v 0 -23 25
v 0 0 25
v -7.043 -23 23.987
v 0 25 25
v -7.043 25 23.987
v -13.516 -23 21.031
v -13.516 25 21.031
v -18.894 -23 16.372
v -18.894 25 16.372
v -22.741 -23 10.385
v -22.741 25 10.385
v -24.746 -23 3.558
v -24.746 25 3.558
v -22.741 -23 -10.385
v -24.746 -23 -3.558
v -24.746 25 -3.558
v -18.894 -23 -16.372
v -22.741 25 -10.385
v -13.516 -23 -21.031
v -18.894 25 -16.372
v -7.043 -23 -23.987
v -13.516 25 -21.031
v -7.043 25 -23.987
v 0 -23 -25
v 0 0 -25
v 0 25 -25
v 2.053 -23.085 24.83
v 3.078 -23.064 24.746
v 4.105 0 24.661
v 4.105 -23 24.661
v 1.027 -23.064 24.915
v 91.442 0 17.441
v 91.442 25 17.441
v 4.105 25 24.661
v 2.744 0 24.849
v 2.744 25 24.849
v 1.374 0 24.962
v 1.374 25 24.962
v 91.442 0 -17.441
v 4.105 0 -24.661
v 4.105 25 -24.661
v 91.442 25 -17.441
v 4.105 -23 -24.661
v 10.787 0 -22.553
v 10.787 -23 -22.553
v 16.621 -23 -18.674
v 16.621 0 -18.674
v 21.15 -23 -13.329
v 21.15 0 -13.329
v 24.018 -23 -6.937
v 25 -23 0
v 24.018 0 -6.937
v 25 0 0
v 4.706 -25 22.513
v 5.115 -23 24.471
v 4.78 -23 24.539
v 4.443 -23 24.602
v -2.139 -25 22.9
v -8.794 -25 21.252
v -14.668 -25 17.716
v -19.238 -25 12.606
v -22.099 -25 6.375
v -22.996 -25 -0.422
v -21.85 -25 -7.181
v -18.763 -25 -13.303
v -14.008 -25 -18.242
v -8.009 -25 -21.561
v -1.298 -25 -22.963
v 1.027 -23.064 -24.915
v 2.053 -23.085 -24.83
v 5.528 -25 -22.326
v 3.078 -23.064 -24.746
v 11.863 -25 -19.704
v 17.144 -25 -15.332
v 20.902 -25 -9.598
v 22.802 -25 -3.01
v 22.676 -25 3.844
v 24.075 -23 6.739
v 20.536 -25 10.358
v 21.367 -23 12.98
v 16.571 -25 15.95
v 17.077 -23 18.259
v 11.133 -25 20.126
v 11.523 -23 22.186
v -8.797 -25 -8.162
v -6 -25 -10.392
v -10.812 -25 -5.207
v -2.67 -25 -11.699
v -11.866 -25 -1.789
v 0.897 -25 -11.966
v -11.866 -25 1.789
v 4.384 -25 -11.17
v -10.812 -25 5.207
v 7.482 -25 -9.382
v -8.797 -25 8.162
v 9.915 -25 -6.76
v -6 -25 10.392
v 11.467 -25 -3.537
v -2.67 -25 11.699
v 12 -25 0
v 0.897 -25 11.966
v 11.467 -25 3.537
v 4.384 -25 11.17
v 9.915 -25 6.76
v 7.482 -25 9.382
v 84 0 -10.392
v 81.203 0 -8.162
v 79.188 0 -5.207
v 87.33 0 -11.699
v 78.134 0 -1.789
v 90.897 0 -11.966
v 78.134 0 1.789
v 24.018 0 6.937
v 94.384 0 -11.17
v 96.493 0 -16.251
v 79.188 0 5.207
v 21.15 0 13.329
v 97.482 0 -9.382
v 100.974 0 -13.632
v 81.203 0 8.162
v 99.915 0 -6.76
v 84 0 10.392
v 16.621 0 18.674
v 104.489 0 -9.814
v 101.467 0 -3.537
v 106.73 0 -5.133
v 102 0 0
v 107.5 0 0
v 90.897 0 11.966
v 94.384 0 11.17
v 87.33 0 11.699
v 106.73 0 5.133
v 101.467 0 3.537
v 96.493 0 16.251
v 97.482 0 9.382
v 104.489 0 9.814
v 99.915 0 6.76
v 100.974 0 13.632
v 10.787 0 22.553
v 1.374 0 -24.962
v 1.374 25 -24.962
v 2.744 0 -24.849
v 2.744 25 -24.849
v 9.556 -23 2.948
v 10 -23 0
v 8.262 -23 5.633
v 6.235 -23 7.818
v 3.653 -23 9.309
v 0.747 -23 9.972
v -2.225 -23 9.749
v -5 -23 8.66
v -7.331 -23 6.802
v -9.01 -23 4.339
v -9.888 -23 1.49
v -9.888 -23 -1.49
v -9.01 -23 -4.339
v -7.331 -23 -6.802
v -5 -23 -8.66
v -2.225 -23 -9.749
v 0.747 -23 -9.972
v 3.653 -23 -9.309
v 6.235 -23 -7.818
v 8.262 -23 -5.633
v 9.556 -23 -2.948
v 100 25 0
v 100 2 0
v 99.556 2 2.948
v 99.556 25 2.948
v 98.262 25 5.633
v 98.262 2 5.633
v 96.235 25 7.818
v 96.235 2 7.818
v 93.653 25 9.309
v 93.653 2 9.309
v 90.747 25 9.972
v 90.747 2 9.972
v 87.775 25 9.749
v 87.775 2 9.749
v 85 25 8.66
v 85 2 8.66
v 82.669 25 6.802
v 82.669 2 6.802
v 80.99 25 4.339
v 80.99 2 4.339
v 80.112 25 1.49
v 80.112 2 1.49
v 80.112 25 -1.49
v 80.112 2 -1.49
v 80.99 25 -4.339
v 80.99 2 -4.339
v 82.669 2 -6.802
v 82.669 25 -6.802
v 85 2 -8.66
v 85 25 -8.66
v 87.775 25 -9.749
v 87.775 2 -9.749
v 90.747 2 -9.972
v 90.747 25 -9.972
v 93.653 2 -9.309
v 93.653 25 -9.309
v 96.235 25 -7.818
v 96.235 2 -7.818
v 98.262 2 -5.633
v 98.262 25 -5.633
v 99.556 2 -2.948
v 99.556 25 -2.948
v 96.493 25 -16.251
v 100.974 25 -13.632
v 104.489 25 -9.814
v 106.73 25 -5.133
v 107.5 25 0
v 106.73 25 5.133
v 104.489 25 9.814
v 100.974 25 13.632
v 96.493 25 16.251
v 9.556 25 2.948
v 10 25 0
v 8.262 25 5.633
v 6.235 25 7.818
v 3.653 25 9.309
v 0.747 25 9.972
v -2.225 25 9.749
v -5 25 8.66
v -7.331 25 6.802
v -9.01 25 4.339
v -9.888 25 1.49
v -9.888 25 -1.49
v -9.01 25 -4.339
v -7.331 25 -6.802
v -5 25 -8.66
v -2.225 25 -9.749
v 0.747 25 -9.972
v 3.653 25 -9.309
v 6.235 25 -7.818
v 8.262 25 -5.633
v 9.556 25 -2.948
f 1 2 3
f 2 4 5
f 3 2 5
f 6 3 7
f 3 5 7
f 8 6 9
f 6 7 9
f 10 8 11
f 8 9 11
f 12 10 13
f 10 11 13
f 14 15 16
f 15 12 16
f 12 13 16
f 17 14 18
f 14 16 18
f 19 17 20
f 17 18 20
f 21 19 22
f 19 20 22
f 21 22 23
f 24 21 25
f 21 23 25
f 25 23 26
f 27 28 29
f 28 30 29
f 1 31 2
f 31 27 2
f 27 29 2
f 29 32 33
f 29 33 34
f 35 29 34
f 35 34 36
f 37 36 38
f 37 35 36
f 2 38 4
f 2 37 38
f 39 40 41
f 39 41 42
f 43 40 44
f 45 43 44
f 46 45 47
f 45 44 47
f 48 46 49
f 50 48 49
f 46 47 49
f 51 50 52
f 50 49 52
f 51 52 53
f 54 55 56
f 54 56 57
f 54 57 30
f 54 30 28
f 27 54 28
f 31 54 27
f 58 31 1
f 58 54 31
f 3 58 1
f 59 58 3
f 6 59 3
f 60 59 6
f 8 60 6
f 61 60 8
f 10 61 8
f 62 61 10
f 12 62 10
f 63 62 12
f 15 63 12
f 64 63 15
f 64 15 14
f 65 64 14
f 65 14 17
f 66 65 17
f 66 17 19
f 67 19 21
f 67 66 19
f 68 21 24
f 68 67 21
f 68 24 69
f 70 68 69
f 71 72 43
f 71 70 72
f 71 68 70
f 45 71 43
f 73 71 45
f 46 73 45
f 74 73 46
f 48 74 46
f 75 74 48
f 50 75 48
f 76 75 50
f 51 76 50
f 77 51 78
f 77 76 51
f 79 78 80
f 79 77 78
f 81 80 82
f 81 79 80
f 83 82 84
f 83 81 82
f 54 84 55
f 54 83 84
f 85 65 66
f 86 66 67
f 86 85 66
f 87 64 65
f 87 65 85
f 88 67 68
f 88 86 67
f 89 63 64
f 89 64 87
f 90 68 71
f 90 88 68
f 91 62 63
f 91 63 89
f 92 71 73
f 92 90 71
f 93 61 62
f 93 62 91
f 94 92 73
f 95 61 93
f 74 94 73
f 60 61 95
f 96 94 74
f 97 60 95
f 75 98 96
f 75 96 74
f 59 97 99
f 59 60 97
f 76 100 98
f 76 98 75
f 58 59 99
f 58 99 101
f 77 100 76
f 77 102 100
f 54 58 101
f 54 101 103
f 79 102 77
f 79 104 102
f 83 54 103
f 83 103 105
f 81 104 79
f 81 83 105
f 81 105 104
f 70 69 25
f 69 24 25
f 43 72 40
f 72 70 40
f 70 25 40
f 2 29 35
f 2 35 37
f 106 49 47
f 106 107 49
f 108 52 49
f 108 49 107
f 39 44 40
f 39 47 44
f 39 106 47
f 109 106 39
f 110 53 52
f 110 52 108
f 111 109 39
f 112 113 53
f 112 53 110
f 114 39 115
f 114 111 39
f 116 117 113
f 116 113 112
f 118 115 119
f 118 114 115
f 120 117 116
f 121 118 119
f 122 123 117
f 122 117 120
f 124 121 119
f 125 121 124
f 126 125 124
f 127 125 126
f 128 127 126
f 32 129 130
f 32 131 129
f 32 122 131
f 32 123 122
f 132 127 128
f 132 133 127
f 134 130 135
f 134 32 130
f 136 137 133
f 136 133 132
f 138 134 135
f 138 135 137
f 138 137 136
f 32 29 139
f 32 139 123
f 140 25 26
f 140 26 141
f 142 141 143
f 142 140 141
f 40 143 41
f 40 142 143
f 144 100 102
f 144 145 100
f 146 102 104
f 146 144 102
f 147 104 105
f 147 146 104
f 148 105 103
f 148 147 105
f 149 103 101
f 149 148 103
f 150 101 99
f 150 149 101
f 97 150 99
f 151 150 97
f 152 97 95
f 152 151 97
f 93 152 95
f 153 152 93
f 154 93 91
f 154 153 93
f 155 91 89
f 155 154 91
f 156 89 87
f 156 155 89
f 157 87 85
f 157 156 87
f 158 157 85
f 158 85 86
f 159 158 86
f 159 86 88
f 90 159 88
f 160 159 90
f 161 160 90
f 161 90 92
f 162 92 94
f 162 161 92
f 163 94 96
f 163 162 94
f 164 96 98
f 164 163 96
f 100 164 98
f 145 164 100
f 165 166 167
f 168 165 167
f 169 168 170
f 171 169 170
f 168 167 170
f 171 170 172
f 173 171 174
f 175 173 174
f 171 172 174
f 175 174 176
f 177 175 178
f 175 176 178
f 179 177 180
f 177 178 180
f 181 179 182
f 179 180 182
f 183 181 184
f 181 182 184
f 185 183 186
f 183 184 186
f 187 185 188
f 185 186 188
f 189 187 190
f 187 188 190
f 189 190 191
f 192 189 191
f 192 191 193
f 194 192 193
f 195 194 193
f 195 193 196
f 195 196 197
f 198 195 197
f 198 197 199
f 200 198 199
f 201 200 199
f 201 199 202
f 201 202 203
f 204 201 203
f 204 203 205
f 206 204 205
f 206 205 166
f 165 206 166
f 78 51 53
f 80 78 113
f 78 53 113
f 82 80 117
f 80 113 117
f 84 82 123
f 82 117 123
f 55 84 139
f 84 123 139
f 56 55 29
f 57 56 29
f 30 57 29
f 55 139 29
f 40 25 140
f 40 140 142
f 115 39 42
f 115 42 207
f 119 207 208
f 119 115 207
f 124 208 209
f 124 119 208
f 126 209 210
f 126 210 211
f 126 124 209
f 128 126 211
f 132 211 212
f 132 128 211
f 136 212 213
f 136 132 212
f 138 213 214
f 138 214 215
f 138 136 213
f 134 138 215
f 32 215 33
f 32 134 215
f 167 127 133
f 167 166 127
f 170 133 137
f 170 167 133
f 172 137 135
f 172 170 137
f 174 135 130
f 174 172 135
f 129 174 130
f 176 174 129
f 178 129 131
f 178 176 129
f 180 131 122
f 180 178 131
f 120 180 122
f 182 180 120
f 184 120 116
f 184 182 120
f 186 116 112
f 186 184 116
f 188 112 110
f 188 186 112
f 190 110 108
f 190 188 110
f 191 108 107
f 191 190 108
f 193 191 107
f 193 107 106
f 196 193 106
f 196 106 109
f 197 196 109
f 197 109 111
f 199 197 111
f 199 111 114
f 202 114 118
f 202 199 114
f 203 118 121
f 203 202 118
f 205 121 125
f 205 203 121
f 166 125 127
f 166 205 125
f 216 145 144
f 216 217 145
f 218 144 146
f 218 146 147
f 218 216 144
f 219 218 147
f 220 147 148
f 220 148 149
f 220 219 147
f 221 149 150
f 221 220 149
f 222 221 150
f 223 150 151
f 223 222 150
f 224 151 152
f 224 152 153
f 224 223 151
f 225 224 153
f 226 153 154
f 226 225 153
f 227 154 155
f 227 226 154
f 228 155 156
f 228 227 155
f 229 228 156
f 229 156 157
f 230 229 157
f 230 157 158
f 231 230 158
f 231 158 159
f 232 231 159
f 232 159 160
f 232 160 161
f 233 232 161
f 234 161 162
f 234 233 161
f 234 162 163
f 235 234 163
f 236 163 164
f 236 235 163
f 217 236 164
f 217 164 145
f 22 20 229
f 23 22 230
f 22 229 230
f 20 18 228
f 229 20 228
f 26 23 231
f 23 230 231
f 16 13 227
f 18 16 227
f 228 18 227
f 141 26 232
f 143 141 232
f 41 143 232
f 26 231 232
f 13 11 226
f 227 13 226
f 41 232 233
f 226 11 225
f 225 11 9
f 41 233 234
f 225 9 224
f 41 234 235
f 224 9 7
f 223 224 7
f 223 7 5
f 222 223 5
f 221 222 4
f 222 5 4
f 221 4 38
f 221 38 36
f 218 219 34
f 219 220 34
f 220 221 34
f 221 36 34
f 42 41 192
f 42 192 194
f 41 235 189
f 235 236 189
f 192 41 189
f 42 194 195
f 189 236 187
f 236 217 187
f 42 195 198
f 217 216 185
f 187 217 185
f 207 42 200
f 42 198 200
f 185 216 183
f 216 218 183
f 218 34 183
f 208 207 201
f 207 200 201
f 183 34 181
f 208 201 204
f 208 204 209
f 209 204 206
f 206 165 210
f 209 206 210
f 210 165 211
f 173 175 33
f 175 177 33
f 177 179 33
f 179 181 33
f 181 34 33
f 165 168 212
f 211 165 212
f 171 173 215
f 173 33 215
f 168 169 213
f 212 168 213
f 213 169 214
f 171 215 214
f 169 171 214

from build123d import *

# Parameters (mm, degrees)
F0_R        = 10
F1_DEPTH    = 25
F2_DEPTH    = 25
F3_T2_ANGLE = 203.6133668192
F3_T8_ANGLE = 184.7022290241


# Not quite as in the source:
# - a fillet or chamfer that OpenCascade refuses, or shapes differently, is made with other operations: its cross-section is extruded or revolved along the edge and cut away or added


with BuildPart() as f1:
    # F0 (on Front) → F1 (new body)
    with BuildSketch(Plane.XZ):
        with BuildLine():
            Line((4.1054428346, 24.6606029758), (0, 25))
            ThreePointArc((0, 25), (-25, 0), (0, -25))
            Line((0, -25), (4.1054428346, -24.6606029758))
            ThreePointArc((4.1054428346, -24.6606029758), (19.0740146648, -16.1611251022), (25, 0))
            ThreePointArc((25, 0), (19.0740146648, 16.1611251022), (4.1054428346, 24.6606029758))
        make_face()
        Circle(F0_R, mode=Mode.SUBTRACT)
        with BuildLine():
            ThreePointArc((4.1054428346, 24.6606029758), (2.0597239626, 24.9150062653), (0, 25))
            Line((0, 25), (4.1054428346, 24.6606029758))
        make_face()
        with BuildLine():
            Line((4.1054428346, -24.6606029758), (0, -25))
            ThreePointArc((0, -25), (2.0597239626, -24.9150062653), (4.1054428346, -24.6606029758))
        make_face()
        with BuildLine():
            Line((91.4418067738, 17.4405043857), (4.1054428346, 24.6606029758))
            ThreePointArc((4.1054428346, 24.6606029758), (19.0740146648, 16.1611251022), (25, 0))
            ThreePointArc((25, 0), (19.0740146648, -16.1611251022), (4.1054428346, -24.6606029758))
            Line((4.1054428346, -24.6606029758), (91.4418067738, -17.4405043857))
            ThreePointArc((91.4418067738, -17.4405043857), (72.5, 0), (91.4418067738, 17.4405043857))
        make_face()
        with BuildLine():
            ThreePointArc((107.5, 0), (102.8740362463, 11.8536572723), (91.4418067738, 17.4405043857))
            ThreePointArc((91.4418067738, 17.4405043857), (72.5, 0), (91.4418067738, -17.4405043857))
            ThreePointArc((91.4418067738, -17.4405043857), (102.8740362463, -11.8536572723), (107.5, 0))
        make_face()
        with Locations((90, 0)):
            Circle(F0_R, mode=Mode.SUBTRACT)
    extrude(amount=-F1_DEPTH)

    # F0 (on Front) → F2 (join)
    with BuildSketch(Plane.XZ):
        with BuildLine():
            Line((4.1054428346, 24.6606029758), (0, 25))
            ThreePointArc((0, 25), (-25, 0), (0, -25))
            Line((0, -25), (4.1054428346, -24.6606029758))
            ThreePointArc((4.1054428346, -24.6606029758), (19.0740146648, -16.1611251022), (25, 0))
            ThreePointArc((25, 0), (19.0740146648, 16.1611251022), (4.1054428346, 24.6606029758))
        make_face()
        Circle(F0_R, mode=Mode.SUBTRACT)
    extrude(amount=F2_DEPTH)

    # F3: chamfer of 2 on 4 edges, made by hand

    # F3_s1 → F3_t2 (revolve, cut)
    with BuildSketch(Plane(origin=(0, 0, 0), x_dir=(0, 1, 0), z_dir=(0.9788435281, 0, -0.2046102329))):
        Polygon((-23, 25), (-25, 23), (-25, 25), align=None)
    revolve(axis=Axis((0, -25, 0), (0, -1, 0)), revolution_arc=F3_T2_ANGLE, mode=Mode.SUBTRACT)

    # F3_s3 → F3_t4 (revolve, cut)
    with BuildSketch(Plane.XY):
        Polygon((102, 0), (100, 2), (100, 0), align=None)
    revolve(axis=Axis((90, 0, 0), (0, -1, 0)), mode=Mode.SUBTRACT)

    # F3_s5 → F3_t6 (revolve, cut)
    with BuildSketch(Plane.XY):
        Polygon((12, -25), (10, -23), (10, -25), align=None)
    revolve(axis=Axis((0, -25, 0), (0, -1, 0)), mode=Mode.SUBTRACT)

    # F3_s7 → F3_t8 (revolve, cut)
    with BuildSketch(Plane(origin=(0, 0, 0), x_dir=(0, 1, 0), z_dir=(-0.9991581953, 0, -0.0410231743))):
        Polygon((-23, -25), (-25, -23), (-25, -25), align=None)
    revolve(axis=Axis((0, -25, 0), (0, 1, 0)), revolution_arc=F3_T8_ANGLE, mode=Mode.SUBTRACT)


solid = f1.part
